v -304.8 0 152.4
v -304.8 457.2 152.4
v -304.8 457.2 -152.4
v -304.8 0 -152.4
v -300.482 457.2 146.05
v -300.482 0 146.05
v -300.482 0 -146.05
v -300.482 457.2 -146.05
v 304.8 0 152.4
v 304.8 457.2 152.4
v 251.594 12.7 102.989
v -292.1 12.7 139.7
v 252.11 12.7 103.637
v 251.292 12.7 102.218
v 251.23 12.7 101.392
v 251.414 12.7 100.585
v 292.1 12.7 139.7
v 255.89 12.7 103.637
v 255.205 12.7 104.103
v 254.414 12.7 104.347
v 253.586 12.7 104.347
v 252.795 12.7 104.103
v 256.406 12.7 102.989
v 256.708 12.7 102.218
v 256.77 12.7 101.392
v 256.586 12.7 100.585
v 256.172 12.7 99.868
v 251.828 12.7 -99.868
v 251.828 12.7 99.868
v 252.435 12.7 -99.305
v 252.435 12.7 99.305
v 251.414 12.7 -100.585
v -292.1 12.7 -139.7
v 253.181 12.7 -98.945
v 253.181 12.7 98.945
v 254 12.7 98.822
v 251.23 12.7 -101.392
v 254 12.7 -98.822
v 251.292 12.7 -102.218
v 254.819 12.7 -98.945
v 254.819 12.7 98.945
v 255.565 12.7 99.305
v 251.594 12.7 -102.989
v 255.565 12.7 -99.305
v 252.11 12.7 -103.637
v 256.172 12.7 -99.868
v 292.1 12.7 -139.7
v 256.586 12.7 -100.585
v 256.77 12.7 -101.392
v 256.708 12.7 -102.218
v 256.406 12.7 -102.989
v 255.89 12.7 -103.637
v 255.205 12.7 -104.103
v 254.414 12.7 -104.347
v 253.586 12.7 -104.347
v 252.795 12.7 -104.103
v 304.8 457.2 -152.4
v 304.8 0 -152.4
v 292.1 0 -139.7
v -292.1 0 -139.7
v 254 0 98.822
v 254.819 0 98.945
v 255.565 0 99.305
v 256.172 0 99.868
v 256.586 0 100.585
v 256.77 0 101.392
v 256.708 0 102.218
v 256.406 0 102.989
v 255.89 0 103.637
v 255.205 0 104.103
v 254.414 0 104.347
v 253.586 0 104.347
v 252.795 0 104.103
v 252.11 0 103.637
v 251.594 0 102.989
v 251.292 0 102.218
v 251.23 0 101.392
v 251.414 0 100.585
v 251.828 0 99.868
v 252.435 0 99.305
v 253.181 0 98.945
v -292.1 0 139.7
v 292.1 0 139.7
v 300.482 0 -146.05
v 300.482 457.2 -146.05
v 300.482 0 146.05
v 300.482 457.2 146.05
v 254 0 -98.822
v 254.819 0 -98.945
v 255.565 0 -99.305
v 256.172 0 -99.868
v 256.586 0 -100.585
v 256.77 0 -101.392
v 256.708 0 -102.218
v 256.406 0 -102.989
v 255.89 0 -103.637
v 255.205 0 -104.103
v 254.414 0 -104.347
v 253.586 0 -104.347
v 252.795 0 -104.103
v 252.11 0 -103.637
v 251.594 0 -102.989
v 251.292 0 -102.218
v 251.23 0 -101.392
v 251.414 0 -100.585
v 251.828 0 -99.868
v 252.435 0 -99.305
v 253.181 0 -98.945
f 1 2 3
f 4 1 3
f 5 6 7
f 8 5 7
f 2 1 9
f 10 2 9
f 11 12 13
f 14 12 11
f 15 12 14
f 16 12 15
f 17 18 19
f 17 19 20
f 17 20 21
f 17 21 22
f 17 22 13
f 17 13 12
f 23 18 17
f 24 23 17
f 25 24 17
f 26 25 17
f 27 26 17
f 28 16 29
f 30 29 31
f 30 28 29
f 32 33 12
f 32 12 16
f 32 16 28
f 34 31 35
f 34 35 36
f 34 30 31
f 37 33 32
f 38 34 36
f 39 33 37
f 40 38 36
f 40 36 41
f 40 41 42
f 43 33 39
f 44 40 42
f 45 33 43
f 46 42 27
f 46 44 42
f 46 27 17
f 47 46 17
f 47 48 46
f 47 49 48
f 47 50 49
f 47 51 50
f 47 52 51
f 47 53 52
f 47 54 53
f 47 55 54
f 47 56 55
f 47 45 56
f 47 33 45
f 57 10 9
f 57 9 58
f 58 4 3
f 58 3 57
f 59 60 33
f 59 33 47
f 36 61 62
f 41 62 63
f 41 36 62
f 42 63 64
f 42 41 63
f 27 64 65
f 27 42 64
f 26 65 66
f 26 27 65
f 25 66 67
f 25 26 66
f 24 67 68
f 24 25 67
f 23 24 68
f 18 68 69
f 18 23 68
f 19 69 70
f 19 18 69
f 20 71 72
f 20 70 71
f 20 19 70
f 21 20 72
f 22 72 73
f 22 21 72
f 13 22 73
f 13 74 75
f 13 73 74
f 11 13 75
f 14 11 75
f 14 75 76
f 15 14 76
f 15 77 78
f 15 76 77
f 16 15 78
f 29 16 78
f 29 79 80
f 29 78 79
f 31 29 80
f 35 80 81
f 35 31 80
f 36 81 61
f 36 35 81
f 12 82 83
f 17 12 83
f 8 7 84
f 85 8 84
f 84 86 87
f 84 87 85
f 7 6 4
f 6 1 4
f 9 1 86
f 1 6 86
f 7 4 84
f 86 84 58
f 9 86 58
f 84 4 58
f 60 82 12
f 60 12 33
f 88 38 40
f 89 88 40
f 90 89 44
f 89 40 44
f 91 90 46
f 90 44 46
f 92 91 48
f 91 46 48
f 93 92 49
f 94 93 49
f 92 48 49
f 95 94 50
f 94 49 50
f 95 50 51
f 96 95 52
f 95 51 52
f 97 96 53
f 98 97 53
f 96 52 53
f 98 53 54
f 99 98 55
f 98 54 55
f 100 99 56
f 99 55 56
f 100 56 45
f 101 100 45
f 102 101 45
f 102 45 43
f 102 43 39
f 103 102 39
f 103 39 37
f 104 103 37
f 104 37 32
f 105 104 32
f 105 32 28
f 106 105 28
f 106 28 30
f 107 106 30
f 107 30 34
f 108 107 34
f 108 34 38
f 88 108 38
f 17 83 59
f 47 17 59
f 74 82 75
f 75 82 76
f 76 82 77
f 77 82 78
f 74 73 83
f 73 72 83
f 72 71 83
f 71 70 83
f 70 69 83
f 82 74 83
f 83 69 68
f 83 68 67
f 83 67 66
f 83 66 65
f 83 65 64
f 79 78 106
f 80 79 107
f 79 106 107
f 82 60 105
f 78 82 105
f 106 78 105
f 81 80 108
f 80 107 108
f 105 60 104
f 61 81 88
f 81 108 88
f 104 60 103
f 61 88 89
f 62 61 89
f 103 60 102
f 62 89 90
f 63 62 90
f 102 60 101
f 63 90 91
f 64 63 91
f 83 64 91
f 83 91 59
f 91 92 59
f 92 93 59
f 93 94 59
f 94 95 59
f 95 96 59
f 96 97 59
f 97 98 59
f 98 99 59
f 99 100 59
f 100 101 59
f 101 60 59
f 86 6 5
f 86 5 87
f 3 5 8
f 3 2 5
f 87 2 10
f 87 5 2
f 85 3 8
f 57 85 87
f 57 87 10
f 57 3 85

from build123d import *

# Parameters (mm, degrees)
SKETCH1_W           = 584.2
SKETCH1_H           = 279.4
BOSS_EXTRUDE1_DEPTH = 12.7
SKETCH3_W           = 609.6
SKETCH3_H           = 304.8
SKETCH3_W_2         = 600.964
SKETCH3_H_2         = 292.1
BOSS_EXTRUDE3_DEPTH = 457.2
SKETCH4_R           = 2.778125
CUT_EXTRUDE1_DEPTH  = 561.097357608


with BuildPart() as part:
    # Sketch1 → Boss-Extrude1 (new body)
    with BuildSketch(Plane(origin=(0, 0, 0), x_dir=(1, 0, 0), z_dir=(0, 1, 0))):
        Rectangle(SKETCH1_W, SKETCH1_H)
    extrude(amount=BOSS_EXTRUDE1_DEPTH)

    # Sketch4 → Cut-Extrude1 (cut, through all)
    with BuildSketch(Plane(origin=(0, 12.7, 0), x_dir=(1, 0, 0), z_dir=(0, 1, 0))):
        with Locations(Location((254, 101.6, 0), (0, 0, 270))):
            Circle(SKETCH4_R)
    cut_extrude1 = extrude(amount=-CUT_EXTRUDE1_DEPTH, mode=Mode.SUBTRACT)

    # Mirror1: Cut-Extrude1 across plane
    add(cut_extrude1.mirror(Plane.XY), mode=Mode.SUBTRACT)


with BuildPart() as body_2:
    # Sketch3 → Boss-Extrude3 (new body)
    with BuildSketch(Plane(origin=(0, 0, 0), x_dir=(1, 0, 0), z_dir=(0, 1, 0))):
        Rectangle(SKETCH3_W, SKETCH3_H)
        Rectangle(SKETCH3_W_2, SKETCH3_H_2, mode=Mode.SUBTRACT)
    extrude(amount=BOSS_EXTRUDE3_DEPTH)


solid = Compound([part.part, body_2.part])
